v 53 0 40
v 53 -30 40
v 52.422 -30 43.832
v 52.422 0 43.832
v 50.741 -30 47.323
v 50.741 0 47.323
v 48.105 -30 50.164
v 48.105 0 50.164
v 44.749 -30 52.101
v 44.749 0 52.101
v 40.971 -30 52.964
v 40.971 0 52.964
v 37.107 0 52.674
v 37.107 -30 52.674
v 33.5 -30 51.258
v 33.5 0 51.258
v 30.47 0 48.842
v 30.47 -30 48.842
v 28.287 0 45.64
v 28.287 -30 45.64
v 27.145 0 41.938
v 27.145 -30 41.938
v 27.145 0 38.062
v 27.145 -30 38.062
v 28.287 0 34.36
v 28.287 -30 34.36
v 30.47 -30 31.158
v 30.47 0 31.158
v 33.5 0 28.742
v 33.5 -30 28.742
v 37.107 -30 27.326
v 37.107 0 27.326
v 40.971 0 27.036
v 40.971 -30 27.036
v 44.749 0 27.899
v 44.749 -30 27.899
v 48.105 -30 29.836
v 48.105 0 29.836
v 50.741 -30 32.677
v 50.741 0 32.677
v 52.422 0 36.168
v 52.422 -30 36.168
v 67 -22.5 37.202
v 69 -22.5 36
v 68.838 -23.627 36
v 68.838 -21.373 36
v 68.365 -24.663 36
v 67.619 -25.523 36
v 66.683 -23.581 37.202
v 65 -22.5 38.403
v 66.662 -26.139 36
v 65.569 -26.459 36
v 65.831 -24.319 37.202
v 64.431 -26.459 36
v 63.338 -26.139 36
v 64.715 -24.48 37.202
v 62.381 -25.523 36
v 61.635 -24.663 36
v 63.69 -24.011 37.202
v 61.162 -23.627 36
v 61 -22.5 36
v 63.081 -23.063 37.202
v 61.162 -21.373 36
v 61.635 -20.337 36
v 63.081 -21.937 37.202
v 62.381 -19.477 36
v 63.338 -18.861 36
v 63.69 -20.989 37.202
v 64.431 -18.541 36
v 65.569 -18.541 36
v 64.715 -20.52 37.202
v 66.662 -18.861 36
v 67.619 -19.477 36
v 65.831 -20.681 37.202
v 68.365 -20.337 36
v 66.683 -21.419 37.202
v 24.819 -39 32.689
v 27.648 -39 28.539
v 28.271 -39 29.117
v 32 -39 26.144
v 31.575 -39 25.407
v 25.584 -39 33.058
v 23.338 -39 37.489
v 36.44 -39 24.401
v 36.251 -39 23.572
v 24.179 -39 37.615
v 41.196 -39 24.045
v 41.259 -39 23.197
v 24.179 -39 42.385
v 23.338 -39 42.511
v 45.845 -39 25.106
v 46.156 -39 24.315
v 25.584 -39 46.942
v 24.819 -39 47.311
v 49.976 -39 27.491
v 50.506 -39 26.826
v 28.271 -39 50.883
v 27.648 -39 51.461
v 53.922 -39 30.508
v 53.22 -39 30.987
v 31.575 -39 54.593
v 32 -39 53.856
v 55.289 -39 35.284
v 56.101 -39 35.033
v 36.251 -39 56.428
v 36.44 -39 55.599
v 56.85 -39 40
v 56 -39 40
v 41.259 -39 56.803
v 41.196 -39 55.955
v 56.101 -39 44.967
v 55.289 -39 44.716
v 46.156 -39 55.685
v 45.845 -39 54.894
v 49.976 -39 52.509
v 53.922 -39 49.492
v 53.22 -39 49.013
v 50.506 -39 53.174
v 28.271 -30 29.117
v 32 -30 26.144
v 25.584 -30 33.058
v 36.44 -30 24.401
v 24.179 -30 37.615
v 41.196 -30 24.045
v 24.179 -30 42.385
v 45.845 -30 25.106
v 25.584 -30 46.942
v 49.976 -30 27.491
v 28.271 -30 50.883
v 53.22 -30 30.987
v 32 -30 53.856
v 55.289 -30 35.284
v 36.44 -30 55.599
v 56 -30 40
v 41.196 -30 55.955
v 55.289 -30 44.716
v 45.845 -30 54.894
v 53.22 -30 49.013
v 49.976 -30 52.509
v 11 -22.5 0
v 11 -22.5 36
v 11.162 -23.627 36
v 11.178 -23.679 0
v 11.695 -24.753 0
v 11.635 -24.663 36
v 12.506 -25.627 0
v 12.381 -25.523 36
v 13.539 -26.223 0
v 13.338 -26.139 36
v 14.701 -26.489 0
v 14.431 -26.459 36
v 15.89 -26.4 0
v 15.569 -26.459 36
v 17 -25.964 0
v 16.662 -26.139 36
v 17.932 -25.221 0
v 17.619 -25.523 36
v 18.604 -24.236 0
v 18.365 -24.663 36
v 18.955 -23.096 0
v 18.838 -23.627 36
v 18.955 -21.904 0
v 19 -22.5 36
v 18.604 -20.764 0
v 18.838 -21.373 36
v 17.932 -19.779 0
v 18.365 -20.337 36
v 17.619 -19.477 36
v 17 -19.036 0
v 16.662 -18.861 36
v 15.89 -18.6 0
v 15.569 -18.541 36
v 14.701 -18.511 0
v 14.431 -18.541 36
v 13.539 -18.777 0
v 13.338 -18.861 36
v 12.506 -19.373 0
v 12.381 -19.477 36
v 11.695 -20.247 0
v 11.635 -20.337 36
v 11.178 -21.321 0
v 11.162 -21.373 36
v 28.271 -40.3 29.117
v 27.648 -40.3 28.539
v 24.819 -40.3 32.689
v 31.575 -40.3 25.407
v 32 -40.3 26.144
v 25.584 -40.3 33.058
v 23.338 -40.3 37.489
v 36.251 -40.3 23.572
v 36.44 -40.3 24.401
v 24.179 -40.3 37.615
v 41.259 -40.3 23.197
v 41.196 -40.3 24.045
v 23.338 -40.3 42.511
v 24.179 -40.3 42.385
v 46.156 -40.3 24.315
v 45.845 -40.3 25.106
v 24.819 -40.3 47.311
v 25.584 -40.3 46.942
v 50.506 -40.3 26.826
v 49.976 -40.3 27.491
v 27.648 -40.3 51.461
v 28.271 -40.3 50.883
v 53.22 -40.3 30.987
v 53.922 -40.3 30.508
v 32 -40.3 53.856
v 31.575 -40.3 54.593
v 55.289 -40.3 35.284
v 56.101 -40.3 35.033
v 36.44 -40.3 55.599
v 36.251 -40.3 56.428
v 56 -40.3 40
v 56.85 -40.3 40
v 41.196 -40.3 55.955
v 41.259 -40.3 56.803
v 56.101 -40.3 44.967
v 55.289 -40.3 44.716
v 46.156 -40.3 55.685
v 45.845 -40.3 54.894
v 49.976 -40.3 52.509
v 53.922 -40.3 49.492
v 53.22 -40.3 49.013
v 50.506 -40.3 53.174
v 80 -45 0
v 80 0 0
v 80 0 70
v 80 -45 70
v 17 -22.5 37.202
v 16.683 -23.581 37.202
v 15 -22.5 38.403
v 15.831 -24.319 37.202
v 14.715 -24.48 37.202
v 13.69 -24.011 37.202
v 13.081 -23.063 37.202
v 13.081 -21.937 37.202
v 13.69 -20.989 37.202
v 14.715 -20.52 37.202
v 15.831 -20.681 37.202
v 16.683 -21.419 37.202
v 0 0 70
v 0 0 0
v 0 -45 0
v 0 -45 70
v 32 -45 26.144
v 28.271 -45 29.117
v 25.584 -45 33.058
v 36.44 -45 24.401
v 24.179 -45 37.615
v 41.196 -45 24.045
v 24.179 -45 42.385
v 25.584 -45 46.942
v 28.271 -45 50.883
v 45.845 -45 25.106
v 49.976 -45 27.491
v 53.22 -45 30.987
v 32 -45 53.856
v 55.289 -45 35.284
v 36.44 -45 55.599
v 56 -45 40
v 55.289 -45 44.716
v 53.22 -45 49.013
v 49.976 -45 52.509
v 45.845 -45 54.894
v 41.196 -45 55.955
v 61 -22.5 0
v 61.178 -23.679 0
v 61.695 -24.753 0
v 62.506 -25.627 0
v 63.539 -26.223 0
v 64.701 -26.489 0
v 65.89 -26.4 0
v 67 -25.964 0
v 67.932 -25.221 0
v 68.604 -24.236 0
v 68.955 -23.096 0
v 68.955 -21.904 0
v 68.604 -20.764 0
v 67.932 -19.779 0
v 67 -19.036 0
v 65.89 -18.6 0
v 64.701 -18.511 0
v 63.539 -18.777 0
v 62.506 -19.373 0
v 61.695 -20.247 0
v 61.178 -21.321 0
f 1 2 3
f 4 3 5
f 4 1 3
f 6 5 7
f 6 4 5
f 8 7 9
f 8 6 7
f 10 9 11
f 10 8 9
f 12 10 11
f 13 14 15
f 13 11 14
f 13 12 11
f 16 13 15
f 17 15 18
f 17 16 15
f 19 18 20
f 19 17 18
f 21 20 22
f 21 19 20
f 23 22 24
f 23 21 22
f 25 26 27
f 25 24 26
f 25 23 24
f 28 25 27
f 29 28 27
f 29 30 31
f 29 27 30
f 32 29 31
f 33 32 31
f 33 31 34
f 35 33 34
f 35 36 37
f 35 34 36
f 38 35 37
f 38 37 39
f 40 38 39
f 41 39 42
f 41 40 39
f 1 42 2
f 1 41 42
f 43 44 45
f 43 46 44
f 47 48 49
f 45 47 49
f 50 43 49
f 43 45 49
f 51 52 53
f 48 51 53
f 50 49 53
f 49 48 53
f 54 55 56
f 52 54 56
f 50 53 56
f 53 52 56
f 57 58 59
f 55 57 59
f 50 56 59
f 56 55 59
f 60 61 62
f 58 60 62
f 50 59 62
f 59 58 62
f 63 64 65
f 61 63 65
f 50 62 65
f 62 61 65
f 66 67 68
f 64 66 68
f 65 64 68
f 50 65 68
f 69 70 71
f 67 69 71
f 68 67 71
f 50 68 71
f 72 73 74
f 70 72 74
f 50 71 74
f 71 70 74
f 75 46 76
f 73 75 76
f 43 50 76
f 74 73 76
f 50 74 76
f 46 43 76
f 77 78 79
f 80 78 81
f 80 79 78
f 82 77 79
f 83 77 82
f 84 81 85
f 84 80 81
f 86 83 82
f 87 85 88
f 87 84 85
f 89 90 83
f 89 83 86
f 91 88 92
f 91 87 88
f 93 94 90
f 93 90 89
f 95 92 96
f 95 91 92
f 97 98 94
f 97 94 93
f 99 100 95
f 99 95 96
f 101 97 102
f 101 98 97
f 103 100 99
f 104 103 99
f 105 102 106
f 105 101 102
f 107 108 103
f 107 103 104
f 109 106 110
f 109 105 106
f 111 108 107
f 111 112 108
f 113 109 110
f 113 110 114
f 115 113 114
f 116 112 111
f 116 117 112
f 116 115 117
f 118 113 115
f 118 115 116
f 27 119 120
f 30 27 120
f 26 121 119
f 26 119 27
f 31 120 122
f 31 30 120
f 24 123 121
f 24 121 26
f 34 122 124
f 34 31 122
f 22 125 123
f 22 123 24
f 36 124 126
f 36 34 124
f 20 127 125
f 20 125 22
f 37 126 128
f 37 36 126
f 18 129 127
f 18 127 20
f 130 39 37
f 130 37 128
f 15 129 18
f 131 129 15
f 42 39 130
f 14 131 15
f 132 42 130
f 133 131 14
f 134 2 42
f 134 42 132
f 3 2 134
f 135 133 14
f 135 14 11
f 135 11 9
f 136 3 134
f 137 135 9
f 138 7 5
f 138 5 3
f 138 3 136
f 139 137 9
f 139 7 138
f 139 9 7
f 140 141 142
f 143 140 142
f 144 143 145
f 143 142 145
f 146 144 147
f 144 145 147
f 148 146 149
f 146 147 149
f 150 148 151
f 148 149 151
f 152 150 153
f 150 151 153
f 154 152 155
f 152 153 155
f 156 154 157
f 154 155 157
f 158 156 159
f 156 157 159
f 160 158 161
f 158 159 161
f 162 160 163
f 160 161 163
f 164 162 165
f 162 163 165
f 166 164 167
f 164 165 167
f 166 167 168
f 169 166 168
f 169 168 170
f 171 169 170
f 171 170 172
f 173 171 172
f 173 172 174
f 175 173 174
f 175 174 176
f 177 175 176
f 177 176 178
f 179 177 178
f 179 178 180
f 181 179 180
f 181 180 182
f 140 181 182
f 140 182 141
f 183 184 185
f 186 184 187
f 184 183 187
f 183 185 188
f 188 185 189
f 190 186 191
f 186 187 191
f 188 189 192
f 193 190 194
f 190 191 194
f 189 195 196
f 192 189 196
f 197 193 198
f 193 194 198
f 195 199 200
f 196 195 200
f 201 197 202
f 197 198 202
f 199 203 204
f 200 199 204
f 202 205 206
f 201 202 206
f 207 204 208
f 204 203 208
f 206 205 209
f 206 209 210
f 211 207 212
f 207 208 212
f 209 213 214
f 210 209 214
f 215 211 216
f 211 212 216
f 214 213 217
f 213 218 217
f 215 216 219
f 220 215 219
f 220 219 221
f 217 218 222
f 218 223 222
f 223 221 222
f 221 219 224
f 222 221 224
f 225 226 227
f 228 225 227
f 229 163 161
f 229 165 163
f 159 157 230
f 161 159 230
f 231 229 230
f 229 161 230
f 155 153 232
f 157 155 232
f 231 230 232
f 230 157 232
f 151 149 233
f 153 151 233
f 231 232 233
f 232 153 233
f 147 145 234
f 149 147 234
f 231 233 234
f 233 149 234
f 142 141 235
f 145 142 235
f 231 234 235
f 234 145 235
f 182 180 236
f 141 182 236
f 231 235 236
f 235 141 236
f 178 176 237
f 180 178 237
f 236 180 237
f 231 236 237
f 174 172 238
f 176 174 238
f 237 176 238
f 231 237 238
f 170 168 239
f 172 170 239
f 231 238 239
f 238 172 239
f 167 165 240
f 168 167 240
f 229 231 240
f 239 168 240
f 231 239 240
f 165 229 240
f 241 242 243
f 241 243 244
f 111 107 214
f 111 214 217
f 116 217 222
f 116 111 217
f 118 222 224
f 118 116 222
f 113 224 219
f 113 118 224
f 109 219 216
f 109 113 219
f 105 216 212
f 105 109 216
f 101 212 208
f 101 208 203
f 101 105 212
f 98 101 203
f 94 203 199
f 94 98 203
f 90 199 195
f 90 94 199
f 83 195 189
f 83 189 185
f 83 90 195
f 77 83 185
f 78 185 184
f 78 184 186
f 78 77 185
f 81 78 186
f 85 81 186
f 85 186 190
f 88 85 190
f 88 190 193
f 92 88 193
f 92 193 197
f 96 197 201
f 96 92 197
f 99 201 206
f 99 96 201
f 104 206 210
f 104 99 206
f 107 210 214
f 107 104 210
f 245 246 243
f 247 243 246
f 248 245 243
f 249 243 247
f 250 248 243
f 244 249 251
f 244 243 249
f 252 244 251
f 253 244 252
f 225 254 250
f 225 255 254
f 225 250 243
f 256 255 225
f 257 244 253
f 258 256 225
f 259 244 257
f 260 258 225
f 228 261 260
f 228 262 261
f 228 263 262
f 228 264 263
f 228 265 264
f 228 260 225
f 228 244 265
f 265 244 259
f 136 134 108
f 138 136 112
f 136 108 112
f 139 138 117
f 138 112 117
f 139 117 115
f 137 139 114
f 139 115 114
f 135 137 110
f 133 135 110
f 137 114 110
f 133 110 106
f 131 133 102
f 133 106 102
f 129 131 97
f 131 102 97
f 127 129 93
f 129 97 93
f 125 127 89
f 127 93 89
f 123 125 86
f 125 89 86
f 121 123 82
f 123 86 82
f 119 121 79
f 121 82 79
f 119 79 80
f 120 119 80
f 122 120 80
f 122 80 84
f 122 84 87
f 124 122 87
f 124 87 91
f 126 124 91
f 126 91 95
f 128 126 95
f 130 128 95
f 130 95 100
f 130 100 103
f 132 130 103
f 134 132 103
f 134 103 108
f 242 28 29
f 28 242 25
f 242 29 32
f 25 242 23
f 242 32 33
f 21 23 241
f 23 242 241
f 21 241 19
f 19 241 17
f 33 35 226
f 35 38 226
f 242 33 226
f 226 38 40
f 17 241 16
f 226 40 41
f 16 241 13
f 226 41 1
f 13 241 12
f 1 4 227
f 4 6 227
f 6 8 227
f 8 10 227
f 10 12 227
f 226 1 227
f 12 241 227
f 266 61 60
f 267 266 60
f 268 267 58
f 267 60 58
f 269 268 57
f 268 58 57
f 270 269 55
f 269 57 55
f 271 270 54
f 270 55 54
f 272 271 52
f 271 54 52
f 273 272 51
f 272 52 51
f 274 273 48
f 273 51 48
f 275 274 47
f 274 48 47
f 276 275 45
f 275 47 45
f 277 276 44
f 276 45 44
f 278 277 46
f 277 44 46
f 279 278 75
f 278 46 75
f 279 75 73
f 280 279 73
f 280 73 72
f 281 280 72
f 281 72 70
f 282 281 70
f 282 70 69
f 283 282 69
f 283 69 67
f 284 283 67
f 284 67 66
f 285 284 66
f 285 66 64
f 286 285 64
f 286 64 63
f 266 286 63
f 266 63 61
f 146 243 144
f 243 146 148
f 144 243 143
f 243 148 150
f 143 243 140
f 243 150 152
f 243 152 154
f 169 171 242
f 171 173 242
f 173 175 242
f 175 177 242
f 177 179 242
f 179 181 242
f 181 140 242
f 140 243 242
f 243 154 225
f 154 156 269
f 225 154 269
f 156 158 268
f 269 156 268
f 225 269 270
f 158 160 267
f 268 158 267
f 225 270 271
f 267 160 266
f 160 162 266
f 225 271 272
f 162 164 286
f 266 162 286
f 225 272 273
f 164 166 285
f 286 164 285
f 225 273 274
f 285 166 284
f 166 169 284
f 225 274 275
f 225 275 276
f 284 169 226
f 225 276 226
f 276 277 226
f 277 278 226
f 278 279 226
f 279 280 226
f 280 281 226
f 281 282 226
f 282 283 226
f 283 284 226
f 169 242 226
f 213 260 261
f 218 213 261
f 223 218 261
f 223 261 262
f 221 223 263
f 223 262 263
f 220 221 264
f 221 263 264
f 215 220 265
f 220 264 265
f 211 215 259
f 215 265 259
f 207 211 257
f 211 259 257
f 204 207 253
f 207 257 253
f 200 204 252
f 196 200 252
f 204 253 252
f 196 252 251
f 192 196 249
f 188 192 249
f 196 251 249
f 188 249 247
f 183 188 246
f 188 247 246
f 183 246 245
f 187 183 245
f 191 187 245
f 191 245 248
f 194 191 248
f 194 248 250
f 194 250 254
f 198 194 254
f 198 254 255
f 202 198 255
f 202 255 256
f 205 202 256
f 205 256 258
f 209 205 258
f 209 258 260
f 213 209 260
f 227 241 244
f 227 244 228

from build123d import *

# Parameters (mm, degrees)
F0_W           = 80
F0_H           = 70
F0_R           = 13
F1_DEPTH       = 45
F2_R           = 16
F3_DEPTH       = 15
F5_R           = 16.85
F6_DEPTH       = 1.3
F8_D           = 8
F8_DEPTH       = 36
F8_CBORE_D     = 8
F8_CBORE_DEPTH = 0
F8_TIP         = 2.4034424761


with BuildPart() as f1:
    # F0 (on Front) → F1 (new body)
    with BuildSketch(Plane.XZ):
        with Locations((40, 35)):
            Rectangle(F0_W, F0_H)
        with Locations((40, 40)):
            Circle(F0_R, mode=Mode.SUBTRACT)
    extrude(amount=F1_DEPTH)

    # F2 (on face) → F3 (cut)
    with BuildSketch(Plane.XZ.offset(45)):
        with Locations((40, 40)):
            Circle(F2_R)
    extrude(amount=-F3_DEPTH, mode=Mode.SUBTRACT)

    # F5 (on offset) → F6 (cut)
    with BuildSketch(Plane.XZ.offset(39)):
        with Locations((40, 40)):
            Circle(F5_R)
    extrude(amount=F6_DEPTH, mode=Mode.SUBTRACT)

    # F8
    with Locations(Plane(origin=(0, 0, 0), x_dir=(1, 0, 0), z_dir=(0, 0, -1))):
        with Locations((15, 22.5), (65, 22.5)):
            CounterBoreHole(F8_D / 2, F8_CBORE_D / 2, F8_CBORE_DEPTH, depth=F8_DEPTH)
            with Locations((0, 0, -(F8_DEPTH + F8_TIP / 2))):  # 118° drill point
                Cone(0, F8_D / 2, F8_TIP, mode=Mode.SUBTRACT)


solid = f1.part
